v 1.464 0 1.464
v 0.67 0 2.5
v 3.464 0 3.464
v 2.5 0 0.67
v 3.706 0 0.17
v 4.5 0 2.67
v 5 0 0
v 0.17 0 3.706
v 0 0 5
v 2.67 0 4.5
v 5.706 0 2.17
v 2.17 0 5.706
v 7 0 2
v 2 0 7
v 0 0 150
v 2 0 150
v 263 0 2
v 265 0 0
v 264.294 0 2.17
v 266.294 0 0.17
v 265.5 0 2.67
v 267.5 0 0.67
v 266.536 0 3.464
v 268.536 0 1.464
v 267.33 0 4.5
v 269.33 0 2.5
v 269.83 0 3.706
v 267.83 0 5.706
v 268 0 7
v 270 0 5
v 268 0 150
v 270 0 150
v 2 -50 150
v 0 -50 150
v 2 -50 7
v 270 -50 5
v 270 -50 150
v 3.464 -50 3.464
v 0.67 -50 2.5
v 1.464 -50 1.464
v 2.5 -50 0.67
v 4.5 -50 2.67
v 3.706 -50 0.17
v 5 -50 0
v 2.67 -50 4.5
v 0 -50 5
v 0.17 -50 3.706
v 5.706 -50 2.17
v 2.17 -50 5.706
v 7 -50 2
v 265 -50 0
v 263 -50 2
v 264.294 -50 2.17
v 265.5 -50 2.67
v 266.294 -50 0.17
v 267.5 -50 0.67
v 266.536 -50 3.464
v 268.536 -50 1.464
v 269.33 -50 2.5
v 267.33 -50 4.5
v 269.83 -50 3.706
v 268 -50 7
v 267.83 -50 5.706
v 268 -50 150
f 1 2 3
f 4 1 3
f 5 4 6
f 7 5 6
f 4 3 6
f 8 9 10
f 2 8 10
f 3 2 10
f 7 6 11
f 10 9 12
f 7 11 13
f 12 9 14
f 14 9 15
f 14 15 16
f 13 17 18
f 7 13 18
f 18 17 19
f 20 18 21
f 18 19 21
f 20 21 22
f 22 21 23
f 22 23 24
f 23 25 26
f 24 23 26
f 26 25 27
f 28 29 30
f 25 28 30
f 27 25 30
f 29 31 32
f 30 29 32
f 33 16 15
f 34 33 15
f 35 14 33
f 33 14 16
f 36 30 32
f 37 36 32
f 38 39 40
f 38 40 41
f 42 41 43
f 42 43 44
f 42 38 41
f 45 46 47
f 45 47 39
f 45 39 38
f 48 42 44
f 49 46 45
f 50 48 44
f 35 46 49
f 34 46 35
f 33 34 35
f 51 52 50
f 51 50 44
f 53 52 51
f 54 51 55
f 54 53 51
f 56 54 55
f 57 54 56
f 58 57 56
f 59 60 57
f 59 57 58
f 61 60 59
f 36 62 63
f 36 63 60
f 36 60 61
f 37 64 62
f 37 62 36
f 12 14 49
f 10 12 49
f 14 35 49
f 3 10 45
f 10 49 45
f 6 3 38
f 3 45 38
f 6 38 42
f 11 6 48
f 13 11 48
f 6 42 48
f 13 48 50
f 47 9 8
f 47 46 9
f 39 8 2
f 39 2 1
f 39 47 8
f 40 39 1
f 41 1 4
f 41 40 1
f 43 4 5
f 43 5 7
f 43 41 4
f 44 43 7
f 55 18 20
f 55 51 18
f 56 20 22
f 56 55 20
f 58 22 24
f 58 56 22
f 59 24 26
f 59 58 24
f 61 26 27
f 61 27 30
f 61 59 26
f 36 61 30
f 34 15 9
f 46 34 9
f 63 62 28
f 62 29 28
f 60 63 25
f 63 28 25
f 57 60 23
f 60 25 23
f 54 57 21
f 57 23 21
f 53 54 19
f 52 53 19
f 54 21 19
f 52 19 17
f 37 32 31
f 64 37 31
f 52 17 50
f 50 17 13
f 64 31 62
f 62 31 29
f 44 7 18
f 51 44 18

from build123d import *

# Parameters (mm, degrees)
F1_DEPTH = 50
F2_DEPTH = 25
F3_R     = 5
F4_R     = 5
F5_R     = 5
F6_R     = 5


with BuildPart() as f1:
    # F0 (on Front) → F1 (new body)
    with BuildSketch(Plane.XZ):
        Polygon((268, 2), (2, 2), (2, 150), (0, 150), (0, 0), (270, 0), (270, 150), (268, 150), align=None)
    extrude(amount=F1_DEPTH)

    # F0 (on Front) → F2 (join)
    with BuildSketch(Plane.XZ):
        Polygon((268, 2), (2, 2), (2, 150), (0, 150), (0, 0), (270, 0), (270, 150), (268, 150), align=None)
    extrude(amount=F2_DEPTH)

    # F3
    f3_edges = [f1.edges().sort_by_distance(p)[0] for p in [
        (0, -25, 0),
    ]]
    fillet(f3_edges, radius=F3_R)

    # F4
    f4_edges = [f1.edges().sort_by_distance(p)[0] for p in [
        (2, -25, 2),
    ]]
    fillet(f4_edges, radius=F4_R)

    # F5
    f5_edges = [f1.edges().sort_by_distance(p)[0] for p in [
        (270, -25, 0),
    ]]
    fillet(f5_edges, radius=F5_R)

    # F6
    f6_edges = [f1.edges().sort_by_distance(p)[0] for p in [
        (268, -25, 2),
    ]]
    fillet(f6_edges, radius=F6_R)


solid = f1.part
